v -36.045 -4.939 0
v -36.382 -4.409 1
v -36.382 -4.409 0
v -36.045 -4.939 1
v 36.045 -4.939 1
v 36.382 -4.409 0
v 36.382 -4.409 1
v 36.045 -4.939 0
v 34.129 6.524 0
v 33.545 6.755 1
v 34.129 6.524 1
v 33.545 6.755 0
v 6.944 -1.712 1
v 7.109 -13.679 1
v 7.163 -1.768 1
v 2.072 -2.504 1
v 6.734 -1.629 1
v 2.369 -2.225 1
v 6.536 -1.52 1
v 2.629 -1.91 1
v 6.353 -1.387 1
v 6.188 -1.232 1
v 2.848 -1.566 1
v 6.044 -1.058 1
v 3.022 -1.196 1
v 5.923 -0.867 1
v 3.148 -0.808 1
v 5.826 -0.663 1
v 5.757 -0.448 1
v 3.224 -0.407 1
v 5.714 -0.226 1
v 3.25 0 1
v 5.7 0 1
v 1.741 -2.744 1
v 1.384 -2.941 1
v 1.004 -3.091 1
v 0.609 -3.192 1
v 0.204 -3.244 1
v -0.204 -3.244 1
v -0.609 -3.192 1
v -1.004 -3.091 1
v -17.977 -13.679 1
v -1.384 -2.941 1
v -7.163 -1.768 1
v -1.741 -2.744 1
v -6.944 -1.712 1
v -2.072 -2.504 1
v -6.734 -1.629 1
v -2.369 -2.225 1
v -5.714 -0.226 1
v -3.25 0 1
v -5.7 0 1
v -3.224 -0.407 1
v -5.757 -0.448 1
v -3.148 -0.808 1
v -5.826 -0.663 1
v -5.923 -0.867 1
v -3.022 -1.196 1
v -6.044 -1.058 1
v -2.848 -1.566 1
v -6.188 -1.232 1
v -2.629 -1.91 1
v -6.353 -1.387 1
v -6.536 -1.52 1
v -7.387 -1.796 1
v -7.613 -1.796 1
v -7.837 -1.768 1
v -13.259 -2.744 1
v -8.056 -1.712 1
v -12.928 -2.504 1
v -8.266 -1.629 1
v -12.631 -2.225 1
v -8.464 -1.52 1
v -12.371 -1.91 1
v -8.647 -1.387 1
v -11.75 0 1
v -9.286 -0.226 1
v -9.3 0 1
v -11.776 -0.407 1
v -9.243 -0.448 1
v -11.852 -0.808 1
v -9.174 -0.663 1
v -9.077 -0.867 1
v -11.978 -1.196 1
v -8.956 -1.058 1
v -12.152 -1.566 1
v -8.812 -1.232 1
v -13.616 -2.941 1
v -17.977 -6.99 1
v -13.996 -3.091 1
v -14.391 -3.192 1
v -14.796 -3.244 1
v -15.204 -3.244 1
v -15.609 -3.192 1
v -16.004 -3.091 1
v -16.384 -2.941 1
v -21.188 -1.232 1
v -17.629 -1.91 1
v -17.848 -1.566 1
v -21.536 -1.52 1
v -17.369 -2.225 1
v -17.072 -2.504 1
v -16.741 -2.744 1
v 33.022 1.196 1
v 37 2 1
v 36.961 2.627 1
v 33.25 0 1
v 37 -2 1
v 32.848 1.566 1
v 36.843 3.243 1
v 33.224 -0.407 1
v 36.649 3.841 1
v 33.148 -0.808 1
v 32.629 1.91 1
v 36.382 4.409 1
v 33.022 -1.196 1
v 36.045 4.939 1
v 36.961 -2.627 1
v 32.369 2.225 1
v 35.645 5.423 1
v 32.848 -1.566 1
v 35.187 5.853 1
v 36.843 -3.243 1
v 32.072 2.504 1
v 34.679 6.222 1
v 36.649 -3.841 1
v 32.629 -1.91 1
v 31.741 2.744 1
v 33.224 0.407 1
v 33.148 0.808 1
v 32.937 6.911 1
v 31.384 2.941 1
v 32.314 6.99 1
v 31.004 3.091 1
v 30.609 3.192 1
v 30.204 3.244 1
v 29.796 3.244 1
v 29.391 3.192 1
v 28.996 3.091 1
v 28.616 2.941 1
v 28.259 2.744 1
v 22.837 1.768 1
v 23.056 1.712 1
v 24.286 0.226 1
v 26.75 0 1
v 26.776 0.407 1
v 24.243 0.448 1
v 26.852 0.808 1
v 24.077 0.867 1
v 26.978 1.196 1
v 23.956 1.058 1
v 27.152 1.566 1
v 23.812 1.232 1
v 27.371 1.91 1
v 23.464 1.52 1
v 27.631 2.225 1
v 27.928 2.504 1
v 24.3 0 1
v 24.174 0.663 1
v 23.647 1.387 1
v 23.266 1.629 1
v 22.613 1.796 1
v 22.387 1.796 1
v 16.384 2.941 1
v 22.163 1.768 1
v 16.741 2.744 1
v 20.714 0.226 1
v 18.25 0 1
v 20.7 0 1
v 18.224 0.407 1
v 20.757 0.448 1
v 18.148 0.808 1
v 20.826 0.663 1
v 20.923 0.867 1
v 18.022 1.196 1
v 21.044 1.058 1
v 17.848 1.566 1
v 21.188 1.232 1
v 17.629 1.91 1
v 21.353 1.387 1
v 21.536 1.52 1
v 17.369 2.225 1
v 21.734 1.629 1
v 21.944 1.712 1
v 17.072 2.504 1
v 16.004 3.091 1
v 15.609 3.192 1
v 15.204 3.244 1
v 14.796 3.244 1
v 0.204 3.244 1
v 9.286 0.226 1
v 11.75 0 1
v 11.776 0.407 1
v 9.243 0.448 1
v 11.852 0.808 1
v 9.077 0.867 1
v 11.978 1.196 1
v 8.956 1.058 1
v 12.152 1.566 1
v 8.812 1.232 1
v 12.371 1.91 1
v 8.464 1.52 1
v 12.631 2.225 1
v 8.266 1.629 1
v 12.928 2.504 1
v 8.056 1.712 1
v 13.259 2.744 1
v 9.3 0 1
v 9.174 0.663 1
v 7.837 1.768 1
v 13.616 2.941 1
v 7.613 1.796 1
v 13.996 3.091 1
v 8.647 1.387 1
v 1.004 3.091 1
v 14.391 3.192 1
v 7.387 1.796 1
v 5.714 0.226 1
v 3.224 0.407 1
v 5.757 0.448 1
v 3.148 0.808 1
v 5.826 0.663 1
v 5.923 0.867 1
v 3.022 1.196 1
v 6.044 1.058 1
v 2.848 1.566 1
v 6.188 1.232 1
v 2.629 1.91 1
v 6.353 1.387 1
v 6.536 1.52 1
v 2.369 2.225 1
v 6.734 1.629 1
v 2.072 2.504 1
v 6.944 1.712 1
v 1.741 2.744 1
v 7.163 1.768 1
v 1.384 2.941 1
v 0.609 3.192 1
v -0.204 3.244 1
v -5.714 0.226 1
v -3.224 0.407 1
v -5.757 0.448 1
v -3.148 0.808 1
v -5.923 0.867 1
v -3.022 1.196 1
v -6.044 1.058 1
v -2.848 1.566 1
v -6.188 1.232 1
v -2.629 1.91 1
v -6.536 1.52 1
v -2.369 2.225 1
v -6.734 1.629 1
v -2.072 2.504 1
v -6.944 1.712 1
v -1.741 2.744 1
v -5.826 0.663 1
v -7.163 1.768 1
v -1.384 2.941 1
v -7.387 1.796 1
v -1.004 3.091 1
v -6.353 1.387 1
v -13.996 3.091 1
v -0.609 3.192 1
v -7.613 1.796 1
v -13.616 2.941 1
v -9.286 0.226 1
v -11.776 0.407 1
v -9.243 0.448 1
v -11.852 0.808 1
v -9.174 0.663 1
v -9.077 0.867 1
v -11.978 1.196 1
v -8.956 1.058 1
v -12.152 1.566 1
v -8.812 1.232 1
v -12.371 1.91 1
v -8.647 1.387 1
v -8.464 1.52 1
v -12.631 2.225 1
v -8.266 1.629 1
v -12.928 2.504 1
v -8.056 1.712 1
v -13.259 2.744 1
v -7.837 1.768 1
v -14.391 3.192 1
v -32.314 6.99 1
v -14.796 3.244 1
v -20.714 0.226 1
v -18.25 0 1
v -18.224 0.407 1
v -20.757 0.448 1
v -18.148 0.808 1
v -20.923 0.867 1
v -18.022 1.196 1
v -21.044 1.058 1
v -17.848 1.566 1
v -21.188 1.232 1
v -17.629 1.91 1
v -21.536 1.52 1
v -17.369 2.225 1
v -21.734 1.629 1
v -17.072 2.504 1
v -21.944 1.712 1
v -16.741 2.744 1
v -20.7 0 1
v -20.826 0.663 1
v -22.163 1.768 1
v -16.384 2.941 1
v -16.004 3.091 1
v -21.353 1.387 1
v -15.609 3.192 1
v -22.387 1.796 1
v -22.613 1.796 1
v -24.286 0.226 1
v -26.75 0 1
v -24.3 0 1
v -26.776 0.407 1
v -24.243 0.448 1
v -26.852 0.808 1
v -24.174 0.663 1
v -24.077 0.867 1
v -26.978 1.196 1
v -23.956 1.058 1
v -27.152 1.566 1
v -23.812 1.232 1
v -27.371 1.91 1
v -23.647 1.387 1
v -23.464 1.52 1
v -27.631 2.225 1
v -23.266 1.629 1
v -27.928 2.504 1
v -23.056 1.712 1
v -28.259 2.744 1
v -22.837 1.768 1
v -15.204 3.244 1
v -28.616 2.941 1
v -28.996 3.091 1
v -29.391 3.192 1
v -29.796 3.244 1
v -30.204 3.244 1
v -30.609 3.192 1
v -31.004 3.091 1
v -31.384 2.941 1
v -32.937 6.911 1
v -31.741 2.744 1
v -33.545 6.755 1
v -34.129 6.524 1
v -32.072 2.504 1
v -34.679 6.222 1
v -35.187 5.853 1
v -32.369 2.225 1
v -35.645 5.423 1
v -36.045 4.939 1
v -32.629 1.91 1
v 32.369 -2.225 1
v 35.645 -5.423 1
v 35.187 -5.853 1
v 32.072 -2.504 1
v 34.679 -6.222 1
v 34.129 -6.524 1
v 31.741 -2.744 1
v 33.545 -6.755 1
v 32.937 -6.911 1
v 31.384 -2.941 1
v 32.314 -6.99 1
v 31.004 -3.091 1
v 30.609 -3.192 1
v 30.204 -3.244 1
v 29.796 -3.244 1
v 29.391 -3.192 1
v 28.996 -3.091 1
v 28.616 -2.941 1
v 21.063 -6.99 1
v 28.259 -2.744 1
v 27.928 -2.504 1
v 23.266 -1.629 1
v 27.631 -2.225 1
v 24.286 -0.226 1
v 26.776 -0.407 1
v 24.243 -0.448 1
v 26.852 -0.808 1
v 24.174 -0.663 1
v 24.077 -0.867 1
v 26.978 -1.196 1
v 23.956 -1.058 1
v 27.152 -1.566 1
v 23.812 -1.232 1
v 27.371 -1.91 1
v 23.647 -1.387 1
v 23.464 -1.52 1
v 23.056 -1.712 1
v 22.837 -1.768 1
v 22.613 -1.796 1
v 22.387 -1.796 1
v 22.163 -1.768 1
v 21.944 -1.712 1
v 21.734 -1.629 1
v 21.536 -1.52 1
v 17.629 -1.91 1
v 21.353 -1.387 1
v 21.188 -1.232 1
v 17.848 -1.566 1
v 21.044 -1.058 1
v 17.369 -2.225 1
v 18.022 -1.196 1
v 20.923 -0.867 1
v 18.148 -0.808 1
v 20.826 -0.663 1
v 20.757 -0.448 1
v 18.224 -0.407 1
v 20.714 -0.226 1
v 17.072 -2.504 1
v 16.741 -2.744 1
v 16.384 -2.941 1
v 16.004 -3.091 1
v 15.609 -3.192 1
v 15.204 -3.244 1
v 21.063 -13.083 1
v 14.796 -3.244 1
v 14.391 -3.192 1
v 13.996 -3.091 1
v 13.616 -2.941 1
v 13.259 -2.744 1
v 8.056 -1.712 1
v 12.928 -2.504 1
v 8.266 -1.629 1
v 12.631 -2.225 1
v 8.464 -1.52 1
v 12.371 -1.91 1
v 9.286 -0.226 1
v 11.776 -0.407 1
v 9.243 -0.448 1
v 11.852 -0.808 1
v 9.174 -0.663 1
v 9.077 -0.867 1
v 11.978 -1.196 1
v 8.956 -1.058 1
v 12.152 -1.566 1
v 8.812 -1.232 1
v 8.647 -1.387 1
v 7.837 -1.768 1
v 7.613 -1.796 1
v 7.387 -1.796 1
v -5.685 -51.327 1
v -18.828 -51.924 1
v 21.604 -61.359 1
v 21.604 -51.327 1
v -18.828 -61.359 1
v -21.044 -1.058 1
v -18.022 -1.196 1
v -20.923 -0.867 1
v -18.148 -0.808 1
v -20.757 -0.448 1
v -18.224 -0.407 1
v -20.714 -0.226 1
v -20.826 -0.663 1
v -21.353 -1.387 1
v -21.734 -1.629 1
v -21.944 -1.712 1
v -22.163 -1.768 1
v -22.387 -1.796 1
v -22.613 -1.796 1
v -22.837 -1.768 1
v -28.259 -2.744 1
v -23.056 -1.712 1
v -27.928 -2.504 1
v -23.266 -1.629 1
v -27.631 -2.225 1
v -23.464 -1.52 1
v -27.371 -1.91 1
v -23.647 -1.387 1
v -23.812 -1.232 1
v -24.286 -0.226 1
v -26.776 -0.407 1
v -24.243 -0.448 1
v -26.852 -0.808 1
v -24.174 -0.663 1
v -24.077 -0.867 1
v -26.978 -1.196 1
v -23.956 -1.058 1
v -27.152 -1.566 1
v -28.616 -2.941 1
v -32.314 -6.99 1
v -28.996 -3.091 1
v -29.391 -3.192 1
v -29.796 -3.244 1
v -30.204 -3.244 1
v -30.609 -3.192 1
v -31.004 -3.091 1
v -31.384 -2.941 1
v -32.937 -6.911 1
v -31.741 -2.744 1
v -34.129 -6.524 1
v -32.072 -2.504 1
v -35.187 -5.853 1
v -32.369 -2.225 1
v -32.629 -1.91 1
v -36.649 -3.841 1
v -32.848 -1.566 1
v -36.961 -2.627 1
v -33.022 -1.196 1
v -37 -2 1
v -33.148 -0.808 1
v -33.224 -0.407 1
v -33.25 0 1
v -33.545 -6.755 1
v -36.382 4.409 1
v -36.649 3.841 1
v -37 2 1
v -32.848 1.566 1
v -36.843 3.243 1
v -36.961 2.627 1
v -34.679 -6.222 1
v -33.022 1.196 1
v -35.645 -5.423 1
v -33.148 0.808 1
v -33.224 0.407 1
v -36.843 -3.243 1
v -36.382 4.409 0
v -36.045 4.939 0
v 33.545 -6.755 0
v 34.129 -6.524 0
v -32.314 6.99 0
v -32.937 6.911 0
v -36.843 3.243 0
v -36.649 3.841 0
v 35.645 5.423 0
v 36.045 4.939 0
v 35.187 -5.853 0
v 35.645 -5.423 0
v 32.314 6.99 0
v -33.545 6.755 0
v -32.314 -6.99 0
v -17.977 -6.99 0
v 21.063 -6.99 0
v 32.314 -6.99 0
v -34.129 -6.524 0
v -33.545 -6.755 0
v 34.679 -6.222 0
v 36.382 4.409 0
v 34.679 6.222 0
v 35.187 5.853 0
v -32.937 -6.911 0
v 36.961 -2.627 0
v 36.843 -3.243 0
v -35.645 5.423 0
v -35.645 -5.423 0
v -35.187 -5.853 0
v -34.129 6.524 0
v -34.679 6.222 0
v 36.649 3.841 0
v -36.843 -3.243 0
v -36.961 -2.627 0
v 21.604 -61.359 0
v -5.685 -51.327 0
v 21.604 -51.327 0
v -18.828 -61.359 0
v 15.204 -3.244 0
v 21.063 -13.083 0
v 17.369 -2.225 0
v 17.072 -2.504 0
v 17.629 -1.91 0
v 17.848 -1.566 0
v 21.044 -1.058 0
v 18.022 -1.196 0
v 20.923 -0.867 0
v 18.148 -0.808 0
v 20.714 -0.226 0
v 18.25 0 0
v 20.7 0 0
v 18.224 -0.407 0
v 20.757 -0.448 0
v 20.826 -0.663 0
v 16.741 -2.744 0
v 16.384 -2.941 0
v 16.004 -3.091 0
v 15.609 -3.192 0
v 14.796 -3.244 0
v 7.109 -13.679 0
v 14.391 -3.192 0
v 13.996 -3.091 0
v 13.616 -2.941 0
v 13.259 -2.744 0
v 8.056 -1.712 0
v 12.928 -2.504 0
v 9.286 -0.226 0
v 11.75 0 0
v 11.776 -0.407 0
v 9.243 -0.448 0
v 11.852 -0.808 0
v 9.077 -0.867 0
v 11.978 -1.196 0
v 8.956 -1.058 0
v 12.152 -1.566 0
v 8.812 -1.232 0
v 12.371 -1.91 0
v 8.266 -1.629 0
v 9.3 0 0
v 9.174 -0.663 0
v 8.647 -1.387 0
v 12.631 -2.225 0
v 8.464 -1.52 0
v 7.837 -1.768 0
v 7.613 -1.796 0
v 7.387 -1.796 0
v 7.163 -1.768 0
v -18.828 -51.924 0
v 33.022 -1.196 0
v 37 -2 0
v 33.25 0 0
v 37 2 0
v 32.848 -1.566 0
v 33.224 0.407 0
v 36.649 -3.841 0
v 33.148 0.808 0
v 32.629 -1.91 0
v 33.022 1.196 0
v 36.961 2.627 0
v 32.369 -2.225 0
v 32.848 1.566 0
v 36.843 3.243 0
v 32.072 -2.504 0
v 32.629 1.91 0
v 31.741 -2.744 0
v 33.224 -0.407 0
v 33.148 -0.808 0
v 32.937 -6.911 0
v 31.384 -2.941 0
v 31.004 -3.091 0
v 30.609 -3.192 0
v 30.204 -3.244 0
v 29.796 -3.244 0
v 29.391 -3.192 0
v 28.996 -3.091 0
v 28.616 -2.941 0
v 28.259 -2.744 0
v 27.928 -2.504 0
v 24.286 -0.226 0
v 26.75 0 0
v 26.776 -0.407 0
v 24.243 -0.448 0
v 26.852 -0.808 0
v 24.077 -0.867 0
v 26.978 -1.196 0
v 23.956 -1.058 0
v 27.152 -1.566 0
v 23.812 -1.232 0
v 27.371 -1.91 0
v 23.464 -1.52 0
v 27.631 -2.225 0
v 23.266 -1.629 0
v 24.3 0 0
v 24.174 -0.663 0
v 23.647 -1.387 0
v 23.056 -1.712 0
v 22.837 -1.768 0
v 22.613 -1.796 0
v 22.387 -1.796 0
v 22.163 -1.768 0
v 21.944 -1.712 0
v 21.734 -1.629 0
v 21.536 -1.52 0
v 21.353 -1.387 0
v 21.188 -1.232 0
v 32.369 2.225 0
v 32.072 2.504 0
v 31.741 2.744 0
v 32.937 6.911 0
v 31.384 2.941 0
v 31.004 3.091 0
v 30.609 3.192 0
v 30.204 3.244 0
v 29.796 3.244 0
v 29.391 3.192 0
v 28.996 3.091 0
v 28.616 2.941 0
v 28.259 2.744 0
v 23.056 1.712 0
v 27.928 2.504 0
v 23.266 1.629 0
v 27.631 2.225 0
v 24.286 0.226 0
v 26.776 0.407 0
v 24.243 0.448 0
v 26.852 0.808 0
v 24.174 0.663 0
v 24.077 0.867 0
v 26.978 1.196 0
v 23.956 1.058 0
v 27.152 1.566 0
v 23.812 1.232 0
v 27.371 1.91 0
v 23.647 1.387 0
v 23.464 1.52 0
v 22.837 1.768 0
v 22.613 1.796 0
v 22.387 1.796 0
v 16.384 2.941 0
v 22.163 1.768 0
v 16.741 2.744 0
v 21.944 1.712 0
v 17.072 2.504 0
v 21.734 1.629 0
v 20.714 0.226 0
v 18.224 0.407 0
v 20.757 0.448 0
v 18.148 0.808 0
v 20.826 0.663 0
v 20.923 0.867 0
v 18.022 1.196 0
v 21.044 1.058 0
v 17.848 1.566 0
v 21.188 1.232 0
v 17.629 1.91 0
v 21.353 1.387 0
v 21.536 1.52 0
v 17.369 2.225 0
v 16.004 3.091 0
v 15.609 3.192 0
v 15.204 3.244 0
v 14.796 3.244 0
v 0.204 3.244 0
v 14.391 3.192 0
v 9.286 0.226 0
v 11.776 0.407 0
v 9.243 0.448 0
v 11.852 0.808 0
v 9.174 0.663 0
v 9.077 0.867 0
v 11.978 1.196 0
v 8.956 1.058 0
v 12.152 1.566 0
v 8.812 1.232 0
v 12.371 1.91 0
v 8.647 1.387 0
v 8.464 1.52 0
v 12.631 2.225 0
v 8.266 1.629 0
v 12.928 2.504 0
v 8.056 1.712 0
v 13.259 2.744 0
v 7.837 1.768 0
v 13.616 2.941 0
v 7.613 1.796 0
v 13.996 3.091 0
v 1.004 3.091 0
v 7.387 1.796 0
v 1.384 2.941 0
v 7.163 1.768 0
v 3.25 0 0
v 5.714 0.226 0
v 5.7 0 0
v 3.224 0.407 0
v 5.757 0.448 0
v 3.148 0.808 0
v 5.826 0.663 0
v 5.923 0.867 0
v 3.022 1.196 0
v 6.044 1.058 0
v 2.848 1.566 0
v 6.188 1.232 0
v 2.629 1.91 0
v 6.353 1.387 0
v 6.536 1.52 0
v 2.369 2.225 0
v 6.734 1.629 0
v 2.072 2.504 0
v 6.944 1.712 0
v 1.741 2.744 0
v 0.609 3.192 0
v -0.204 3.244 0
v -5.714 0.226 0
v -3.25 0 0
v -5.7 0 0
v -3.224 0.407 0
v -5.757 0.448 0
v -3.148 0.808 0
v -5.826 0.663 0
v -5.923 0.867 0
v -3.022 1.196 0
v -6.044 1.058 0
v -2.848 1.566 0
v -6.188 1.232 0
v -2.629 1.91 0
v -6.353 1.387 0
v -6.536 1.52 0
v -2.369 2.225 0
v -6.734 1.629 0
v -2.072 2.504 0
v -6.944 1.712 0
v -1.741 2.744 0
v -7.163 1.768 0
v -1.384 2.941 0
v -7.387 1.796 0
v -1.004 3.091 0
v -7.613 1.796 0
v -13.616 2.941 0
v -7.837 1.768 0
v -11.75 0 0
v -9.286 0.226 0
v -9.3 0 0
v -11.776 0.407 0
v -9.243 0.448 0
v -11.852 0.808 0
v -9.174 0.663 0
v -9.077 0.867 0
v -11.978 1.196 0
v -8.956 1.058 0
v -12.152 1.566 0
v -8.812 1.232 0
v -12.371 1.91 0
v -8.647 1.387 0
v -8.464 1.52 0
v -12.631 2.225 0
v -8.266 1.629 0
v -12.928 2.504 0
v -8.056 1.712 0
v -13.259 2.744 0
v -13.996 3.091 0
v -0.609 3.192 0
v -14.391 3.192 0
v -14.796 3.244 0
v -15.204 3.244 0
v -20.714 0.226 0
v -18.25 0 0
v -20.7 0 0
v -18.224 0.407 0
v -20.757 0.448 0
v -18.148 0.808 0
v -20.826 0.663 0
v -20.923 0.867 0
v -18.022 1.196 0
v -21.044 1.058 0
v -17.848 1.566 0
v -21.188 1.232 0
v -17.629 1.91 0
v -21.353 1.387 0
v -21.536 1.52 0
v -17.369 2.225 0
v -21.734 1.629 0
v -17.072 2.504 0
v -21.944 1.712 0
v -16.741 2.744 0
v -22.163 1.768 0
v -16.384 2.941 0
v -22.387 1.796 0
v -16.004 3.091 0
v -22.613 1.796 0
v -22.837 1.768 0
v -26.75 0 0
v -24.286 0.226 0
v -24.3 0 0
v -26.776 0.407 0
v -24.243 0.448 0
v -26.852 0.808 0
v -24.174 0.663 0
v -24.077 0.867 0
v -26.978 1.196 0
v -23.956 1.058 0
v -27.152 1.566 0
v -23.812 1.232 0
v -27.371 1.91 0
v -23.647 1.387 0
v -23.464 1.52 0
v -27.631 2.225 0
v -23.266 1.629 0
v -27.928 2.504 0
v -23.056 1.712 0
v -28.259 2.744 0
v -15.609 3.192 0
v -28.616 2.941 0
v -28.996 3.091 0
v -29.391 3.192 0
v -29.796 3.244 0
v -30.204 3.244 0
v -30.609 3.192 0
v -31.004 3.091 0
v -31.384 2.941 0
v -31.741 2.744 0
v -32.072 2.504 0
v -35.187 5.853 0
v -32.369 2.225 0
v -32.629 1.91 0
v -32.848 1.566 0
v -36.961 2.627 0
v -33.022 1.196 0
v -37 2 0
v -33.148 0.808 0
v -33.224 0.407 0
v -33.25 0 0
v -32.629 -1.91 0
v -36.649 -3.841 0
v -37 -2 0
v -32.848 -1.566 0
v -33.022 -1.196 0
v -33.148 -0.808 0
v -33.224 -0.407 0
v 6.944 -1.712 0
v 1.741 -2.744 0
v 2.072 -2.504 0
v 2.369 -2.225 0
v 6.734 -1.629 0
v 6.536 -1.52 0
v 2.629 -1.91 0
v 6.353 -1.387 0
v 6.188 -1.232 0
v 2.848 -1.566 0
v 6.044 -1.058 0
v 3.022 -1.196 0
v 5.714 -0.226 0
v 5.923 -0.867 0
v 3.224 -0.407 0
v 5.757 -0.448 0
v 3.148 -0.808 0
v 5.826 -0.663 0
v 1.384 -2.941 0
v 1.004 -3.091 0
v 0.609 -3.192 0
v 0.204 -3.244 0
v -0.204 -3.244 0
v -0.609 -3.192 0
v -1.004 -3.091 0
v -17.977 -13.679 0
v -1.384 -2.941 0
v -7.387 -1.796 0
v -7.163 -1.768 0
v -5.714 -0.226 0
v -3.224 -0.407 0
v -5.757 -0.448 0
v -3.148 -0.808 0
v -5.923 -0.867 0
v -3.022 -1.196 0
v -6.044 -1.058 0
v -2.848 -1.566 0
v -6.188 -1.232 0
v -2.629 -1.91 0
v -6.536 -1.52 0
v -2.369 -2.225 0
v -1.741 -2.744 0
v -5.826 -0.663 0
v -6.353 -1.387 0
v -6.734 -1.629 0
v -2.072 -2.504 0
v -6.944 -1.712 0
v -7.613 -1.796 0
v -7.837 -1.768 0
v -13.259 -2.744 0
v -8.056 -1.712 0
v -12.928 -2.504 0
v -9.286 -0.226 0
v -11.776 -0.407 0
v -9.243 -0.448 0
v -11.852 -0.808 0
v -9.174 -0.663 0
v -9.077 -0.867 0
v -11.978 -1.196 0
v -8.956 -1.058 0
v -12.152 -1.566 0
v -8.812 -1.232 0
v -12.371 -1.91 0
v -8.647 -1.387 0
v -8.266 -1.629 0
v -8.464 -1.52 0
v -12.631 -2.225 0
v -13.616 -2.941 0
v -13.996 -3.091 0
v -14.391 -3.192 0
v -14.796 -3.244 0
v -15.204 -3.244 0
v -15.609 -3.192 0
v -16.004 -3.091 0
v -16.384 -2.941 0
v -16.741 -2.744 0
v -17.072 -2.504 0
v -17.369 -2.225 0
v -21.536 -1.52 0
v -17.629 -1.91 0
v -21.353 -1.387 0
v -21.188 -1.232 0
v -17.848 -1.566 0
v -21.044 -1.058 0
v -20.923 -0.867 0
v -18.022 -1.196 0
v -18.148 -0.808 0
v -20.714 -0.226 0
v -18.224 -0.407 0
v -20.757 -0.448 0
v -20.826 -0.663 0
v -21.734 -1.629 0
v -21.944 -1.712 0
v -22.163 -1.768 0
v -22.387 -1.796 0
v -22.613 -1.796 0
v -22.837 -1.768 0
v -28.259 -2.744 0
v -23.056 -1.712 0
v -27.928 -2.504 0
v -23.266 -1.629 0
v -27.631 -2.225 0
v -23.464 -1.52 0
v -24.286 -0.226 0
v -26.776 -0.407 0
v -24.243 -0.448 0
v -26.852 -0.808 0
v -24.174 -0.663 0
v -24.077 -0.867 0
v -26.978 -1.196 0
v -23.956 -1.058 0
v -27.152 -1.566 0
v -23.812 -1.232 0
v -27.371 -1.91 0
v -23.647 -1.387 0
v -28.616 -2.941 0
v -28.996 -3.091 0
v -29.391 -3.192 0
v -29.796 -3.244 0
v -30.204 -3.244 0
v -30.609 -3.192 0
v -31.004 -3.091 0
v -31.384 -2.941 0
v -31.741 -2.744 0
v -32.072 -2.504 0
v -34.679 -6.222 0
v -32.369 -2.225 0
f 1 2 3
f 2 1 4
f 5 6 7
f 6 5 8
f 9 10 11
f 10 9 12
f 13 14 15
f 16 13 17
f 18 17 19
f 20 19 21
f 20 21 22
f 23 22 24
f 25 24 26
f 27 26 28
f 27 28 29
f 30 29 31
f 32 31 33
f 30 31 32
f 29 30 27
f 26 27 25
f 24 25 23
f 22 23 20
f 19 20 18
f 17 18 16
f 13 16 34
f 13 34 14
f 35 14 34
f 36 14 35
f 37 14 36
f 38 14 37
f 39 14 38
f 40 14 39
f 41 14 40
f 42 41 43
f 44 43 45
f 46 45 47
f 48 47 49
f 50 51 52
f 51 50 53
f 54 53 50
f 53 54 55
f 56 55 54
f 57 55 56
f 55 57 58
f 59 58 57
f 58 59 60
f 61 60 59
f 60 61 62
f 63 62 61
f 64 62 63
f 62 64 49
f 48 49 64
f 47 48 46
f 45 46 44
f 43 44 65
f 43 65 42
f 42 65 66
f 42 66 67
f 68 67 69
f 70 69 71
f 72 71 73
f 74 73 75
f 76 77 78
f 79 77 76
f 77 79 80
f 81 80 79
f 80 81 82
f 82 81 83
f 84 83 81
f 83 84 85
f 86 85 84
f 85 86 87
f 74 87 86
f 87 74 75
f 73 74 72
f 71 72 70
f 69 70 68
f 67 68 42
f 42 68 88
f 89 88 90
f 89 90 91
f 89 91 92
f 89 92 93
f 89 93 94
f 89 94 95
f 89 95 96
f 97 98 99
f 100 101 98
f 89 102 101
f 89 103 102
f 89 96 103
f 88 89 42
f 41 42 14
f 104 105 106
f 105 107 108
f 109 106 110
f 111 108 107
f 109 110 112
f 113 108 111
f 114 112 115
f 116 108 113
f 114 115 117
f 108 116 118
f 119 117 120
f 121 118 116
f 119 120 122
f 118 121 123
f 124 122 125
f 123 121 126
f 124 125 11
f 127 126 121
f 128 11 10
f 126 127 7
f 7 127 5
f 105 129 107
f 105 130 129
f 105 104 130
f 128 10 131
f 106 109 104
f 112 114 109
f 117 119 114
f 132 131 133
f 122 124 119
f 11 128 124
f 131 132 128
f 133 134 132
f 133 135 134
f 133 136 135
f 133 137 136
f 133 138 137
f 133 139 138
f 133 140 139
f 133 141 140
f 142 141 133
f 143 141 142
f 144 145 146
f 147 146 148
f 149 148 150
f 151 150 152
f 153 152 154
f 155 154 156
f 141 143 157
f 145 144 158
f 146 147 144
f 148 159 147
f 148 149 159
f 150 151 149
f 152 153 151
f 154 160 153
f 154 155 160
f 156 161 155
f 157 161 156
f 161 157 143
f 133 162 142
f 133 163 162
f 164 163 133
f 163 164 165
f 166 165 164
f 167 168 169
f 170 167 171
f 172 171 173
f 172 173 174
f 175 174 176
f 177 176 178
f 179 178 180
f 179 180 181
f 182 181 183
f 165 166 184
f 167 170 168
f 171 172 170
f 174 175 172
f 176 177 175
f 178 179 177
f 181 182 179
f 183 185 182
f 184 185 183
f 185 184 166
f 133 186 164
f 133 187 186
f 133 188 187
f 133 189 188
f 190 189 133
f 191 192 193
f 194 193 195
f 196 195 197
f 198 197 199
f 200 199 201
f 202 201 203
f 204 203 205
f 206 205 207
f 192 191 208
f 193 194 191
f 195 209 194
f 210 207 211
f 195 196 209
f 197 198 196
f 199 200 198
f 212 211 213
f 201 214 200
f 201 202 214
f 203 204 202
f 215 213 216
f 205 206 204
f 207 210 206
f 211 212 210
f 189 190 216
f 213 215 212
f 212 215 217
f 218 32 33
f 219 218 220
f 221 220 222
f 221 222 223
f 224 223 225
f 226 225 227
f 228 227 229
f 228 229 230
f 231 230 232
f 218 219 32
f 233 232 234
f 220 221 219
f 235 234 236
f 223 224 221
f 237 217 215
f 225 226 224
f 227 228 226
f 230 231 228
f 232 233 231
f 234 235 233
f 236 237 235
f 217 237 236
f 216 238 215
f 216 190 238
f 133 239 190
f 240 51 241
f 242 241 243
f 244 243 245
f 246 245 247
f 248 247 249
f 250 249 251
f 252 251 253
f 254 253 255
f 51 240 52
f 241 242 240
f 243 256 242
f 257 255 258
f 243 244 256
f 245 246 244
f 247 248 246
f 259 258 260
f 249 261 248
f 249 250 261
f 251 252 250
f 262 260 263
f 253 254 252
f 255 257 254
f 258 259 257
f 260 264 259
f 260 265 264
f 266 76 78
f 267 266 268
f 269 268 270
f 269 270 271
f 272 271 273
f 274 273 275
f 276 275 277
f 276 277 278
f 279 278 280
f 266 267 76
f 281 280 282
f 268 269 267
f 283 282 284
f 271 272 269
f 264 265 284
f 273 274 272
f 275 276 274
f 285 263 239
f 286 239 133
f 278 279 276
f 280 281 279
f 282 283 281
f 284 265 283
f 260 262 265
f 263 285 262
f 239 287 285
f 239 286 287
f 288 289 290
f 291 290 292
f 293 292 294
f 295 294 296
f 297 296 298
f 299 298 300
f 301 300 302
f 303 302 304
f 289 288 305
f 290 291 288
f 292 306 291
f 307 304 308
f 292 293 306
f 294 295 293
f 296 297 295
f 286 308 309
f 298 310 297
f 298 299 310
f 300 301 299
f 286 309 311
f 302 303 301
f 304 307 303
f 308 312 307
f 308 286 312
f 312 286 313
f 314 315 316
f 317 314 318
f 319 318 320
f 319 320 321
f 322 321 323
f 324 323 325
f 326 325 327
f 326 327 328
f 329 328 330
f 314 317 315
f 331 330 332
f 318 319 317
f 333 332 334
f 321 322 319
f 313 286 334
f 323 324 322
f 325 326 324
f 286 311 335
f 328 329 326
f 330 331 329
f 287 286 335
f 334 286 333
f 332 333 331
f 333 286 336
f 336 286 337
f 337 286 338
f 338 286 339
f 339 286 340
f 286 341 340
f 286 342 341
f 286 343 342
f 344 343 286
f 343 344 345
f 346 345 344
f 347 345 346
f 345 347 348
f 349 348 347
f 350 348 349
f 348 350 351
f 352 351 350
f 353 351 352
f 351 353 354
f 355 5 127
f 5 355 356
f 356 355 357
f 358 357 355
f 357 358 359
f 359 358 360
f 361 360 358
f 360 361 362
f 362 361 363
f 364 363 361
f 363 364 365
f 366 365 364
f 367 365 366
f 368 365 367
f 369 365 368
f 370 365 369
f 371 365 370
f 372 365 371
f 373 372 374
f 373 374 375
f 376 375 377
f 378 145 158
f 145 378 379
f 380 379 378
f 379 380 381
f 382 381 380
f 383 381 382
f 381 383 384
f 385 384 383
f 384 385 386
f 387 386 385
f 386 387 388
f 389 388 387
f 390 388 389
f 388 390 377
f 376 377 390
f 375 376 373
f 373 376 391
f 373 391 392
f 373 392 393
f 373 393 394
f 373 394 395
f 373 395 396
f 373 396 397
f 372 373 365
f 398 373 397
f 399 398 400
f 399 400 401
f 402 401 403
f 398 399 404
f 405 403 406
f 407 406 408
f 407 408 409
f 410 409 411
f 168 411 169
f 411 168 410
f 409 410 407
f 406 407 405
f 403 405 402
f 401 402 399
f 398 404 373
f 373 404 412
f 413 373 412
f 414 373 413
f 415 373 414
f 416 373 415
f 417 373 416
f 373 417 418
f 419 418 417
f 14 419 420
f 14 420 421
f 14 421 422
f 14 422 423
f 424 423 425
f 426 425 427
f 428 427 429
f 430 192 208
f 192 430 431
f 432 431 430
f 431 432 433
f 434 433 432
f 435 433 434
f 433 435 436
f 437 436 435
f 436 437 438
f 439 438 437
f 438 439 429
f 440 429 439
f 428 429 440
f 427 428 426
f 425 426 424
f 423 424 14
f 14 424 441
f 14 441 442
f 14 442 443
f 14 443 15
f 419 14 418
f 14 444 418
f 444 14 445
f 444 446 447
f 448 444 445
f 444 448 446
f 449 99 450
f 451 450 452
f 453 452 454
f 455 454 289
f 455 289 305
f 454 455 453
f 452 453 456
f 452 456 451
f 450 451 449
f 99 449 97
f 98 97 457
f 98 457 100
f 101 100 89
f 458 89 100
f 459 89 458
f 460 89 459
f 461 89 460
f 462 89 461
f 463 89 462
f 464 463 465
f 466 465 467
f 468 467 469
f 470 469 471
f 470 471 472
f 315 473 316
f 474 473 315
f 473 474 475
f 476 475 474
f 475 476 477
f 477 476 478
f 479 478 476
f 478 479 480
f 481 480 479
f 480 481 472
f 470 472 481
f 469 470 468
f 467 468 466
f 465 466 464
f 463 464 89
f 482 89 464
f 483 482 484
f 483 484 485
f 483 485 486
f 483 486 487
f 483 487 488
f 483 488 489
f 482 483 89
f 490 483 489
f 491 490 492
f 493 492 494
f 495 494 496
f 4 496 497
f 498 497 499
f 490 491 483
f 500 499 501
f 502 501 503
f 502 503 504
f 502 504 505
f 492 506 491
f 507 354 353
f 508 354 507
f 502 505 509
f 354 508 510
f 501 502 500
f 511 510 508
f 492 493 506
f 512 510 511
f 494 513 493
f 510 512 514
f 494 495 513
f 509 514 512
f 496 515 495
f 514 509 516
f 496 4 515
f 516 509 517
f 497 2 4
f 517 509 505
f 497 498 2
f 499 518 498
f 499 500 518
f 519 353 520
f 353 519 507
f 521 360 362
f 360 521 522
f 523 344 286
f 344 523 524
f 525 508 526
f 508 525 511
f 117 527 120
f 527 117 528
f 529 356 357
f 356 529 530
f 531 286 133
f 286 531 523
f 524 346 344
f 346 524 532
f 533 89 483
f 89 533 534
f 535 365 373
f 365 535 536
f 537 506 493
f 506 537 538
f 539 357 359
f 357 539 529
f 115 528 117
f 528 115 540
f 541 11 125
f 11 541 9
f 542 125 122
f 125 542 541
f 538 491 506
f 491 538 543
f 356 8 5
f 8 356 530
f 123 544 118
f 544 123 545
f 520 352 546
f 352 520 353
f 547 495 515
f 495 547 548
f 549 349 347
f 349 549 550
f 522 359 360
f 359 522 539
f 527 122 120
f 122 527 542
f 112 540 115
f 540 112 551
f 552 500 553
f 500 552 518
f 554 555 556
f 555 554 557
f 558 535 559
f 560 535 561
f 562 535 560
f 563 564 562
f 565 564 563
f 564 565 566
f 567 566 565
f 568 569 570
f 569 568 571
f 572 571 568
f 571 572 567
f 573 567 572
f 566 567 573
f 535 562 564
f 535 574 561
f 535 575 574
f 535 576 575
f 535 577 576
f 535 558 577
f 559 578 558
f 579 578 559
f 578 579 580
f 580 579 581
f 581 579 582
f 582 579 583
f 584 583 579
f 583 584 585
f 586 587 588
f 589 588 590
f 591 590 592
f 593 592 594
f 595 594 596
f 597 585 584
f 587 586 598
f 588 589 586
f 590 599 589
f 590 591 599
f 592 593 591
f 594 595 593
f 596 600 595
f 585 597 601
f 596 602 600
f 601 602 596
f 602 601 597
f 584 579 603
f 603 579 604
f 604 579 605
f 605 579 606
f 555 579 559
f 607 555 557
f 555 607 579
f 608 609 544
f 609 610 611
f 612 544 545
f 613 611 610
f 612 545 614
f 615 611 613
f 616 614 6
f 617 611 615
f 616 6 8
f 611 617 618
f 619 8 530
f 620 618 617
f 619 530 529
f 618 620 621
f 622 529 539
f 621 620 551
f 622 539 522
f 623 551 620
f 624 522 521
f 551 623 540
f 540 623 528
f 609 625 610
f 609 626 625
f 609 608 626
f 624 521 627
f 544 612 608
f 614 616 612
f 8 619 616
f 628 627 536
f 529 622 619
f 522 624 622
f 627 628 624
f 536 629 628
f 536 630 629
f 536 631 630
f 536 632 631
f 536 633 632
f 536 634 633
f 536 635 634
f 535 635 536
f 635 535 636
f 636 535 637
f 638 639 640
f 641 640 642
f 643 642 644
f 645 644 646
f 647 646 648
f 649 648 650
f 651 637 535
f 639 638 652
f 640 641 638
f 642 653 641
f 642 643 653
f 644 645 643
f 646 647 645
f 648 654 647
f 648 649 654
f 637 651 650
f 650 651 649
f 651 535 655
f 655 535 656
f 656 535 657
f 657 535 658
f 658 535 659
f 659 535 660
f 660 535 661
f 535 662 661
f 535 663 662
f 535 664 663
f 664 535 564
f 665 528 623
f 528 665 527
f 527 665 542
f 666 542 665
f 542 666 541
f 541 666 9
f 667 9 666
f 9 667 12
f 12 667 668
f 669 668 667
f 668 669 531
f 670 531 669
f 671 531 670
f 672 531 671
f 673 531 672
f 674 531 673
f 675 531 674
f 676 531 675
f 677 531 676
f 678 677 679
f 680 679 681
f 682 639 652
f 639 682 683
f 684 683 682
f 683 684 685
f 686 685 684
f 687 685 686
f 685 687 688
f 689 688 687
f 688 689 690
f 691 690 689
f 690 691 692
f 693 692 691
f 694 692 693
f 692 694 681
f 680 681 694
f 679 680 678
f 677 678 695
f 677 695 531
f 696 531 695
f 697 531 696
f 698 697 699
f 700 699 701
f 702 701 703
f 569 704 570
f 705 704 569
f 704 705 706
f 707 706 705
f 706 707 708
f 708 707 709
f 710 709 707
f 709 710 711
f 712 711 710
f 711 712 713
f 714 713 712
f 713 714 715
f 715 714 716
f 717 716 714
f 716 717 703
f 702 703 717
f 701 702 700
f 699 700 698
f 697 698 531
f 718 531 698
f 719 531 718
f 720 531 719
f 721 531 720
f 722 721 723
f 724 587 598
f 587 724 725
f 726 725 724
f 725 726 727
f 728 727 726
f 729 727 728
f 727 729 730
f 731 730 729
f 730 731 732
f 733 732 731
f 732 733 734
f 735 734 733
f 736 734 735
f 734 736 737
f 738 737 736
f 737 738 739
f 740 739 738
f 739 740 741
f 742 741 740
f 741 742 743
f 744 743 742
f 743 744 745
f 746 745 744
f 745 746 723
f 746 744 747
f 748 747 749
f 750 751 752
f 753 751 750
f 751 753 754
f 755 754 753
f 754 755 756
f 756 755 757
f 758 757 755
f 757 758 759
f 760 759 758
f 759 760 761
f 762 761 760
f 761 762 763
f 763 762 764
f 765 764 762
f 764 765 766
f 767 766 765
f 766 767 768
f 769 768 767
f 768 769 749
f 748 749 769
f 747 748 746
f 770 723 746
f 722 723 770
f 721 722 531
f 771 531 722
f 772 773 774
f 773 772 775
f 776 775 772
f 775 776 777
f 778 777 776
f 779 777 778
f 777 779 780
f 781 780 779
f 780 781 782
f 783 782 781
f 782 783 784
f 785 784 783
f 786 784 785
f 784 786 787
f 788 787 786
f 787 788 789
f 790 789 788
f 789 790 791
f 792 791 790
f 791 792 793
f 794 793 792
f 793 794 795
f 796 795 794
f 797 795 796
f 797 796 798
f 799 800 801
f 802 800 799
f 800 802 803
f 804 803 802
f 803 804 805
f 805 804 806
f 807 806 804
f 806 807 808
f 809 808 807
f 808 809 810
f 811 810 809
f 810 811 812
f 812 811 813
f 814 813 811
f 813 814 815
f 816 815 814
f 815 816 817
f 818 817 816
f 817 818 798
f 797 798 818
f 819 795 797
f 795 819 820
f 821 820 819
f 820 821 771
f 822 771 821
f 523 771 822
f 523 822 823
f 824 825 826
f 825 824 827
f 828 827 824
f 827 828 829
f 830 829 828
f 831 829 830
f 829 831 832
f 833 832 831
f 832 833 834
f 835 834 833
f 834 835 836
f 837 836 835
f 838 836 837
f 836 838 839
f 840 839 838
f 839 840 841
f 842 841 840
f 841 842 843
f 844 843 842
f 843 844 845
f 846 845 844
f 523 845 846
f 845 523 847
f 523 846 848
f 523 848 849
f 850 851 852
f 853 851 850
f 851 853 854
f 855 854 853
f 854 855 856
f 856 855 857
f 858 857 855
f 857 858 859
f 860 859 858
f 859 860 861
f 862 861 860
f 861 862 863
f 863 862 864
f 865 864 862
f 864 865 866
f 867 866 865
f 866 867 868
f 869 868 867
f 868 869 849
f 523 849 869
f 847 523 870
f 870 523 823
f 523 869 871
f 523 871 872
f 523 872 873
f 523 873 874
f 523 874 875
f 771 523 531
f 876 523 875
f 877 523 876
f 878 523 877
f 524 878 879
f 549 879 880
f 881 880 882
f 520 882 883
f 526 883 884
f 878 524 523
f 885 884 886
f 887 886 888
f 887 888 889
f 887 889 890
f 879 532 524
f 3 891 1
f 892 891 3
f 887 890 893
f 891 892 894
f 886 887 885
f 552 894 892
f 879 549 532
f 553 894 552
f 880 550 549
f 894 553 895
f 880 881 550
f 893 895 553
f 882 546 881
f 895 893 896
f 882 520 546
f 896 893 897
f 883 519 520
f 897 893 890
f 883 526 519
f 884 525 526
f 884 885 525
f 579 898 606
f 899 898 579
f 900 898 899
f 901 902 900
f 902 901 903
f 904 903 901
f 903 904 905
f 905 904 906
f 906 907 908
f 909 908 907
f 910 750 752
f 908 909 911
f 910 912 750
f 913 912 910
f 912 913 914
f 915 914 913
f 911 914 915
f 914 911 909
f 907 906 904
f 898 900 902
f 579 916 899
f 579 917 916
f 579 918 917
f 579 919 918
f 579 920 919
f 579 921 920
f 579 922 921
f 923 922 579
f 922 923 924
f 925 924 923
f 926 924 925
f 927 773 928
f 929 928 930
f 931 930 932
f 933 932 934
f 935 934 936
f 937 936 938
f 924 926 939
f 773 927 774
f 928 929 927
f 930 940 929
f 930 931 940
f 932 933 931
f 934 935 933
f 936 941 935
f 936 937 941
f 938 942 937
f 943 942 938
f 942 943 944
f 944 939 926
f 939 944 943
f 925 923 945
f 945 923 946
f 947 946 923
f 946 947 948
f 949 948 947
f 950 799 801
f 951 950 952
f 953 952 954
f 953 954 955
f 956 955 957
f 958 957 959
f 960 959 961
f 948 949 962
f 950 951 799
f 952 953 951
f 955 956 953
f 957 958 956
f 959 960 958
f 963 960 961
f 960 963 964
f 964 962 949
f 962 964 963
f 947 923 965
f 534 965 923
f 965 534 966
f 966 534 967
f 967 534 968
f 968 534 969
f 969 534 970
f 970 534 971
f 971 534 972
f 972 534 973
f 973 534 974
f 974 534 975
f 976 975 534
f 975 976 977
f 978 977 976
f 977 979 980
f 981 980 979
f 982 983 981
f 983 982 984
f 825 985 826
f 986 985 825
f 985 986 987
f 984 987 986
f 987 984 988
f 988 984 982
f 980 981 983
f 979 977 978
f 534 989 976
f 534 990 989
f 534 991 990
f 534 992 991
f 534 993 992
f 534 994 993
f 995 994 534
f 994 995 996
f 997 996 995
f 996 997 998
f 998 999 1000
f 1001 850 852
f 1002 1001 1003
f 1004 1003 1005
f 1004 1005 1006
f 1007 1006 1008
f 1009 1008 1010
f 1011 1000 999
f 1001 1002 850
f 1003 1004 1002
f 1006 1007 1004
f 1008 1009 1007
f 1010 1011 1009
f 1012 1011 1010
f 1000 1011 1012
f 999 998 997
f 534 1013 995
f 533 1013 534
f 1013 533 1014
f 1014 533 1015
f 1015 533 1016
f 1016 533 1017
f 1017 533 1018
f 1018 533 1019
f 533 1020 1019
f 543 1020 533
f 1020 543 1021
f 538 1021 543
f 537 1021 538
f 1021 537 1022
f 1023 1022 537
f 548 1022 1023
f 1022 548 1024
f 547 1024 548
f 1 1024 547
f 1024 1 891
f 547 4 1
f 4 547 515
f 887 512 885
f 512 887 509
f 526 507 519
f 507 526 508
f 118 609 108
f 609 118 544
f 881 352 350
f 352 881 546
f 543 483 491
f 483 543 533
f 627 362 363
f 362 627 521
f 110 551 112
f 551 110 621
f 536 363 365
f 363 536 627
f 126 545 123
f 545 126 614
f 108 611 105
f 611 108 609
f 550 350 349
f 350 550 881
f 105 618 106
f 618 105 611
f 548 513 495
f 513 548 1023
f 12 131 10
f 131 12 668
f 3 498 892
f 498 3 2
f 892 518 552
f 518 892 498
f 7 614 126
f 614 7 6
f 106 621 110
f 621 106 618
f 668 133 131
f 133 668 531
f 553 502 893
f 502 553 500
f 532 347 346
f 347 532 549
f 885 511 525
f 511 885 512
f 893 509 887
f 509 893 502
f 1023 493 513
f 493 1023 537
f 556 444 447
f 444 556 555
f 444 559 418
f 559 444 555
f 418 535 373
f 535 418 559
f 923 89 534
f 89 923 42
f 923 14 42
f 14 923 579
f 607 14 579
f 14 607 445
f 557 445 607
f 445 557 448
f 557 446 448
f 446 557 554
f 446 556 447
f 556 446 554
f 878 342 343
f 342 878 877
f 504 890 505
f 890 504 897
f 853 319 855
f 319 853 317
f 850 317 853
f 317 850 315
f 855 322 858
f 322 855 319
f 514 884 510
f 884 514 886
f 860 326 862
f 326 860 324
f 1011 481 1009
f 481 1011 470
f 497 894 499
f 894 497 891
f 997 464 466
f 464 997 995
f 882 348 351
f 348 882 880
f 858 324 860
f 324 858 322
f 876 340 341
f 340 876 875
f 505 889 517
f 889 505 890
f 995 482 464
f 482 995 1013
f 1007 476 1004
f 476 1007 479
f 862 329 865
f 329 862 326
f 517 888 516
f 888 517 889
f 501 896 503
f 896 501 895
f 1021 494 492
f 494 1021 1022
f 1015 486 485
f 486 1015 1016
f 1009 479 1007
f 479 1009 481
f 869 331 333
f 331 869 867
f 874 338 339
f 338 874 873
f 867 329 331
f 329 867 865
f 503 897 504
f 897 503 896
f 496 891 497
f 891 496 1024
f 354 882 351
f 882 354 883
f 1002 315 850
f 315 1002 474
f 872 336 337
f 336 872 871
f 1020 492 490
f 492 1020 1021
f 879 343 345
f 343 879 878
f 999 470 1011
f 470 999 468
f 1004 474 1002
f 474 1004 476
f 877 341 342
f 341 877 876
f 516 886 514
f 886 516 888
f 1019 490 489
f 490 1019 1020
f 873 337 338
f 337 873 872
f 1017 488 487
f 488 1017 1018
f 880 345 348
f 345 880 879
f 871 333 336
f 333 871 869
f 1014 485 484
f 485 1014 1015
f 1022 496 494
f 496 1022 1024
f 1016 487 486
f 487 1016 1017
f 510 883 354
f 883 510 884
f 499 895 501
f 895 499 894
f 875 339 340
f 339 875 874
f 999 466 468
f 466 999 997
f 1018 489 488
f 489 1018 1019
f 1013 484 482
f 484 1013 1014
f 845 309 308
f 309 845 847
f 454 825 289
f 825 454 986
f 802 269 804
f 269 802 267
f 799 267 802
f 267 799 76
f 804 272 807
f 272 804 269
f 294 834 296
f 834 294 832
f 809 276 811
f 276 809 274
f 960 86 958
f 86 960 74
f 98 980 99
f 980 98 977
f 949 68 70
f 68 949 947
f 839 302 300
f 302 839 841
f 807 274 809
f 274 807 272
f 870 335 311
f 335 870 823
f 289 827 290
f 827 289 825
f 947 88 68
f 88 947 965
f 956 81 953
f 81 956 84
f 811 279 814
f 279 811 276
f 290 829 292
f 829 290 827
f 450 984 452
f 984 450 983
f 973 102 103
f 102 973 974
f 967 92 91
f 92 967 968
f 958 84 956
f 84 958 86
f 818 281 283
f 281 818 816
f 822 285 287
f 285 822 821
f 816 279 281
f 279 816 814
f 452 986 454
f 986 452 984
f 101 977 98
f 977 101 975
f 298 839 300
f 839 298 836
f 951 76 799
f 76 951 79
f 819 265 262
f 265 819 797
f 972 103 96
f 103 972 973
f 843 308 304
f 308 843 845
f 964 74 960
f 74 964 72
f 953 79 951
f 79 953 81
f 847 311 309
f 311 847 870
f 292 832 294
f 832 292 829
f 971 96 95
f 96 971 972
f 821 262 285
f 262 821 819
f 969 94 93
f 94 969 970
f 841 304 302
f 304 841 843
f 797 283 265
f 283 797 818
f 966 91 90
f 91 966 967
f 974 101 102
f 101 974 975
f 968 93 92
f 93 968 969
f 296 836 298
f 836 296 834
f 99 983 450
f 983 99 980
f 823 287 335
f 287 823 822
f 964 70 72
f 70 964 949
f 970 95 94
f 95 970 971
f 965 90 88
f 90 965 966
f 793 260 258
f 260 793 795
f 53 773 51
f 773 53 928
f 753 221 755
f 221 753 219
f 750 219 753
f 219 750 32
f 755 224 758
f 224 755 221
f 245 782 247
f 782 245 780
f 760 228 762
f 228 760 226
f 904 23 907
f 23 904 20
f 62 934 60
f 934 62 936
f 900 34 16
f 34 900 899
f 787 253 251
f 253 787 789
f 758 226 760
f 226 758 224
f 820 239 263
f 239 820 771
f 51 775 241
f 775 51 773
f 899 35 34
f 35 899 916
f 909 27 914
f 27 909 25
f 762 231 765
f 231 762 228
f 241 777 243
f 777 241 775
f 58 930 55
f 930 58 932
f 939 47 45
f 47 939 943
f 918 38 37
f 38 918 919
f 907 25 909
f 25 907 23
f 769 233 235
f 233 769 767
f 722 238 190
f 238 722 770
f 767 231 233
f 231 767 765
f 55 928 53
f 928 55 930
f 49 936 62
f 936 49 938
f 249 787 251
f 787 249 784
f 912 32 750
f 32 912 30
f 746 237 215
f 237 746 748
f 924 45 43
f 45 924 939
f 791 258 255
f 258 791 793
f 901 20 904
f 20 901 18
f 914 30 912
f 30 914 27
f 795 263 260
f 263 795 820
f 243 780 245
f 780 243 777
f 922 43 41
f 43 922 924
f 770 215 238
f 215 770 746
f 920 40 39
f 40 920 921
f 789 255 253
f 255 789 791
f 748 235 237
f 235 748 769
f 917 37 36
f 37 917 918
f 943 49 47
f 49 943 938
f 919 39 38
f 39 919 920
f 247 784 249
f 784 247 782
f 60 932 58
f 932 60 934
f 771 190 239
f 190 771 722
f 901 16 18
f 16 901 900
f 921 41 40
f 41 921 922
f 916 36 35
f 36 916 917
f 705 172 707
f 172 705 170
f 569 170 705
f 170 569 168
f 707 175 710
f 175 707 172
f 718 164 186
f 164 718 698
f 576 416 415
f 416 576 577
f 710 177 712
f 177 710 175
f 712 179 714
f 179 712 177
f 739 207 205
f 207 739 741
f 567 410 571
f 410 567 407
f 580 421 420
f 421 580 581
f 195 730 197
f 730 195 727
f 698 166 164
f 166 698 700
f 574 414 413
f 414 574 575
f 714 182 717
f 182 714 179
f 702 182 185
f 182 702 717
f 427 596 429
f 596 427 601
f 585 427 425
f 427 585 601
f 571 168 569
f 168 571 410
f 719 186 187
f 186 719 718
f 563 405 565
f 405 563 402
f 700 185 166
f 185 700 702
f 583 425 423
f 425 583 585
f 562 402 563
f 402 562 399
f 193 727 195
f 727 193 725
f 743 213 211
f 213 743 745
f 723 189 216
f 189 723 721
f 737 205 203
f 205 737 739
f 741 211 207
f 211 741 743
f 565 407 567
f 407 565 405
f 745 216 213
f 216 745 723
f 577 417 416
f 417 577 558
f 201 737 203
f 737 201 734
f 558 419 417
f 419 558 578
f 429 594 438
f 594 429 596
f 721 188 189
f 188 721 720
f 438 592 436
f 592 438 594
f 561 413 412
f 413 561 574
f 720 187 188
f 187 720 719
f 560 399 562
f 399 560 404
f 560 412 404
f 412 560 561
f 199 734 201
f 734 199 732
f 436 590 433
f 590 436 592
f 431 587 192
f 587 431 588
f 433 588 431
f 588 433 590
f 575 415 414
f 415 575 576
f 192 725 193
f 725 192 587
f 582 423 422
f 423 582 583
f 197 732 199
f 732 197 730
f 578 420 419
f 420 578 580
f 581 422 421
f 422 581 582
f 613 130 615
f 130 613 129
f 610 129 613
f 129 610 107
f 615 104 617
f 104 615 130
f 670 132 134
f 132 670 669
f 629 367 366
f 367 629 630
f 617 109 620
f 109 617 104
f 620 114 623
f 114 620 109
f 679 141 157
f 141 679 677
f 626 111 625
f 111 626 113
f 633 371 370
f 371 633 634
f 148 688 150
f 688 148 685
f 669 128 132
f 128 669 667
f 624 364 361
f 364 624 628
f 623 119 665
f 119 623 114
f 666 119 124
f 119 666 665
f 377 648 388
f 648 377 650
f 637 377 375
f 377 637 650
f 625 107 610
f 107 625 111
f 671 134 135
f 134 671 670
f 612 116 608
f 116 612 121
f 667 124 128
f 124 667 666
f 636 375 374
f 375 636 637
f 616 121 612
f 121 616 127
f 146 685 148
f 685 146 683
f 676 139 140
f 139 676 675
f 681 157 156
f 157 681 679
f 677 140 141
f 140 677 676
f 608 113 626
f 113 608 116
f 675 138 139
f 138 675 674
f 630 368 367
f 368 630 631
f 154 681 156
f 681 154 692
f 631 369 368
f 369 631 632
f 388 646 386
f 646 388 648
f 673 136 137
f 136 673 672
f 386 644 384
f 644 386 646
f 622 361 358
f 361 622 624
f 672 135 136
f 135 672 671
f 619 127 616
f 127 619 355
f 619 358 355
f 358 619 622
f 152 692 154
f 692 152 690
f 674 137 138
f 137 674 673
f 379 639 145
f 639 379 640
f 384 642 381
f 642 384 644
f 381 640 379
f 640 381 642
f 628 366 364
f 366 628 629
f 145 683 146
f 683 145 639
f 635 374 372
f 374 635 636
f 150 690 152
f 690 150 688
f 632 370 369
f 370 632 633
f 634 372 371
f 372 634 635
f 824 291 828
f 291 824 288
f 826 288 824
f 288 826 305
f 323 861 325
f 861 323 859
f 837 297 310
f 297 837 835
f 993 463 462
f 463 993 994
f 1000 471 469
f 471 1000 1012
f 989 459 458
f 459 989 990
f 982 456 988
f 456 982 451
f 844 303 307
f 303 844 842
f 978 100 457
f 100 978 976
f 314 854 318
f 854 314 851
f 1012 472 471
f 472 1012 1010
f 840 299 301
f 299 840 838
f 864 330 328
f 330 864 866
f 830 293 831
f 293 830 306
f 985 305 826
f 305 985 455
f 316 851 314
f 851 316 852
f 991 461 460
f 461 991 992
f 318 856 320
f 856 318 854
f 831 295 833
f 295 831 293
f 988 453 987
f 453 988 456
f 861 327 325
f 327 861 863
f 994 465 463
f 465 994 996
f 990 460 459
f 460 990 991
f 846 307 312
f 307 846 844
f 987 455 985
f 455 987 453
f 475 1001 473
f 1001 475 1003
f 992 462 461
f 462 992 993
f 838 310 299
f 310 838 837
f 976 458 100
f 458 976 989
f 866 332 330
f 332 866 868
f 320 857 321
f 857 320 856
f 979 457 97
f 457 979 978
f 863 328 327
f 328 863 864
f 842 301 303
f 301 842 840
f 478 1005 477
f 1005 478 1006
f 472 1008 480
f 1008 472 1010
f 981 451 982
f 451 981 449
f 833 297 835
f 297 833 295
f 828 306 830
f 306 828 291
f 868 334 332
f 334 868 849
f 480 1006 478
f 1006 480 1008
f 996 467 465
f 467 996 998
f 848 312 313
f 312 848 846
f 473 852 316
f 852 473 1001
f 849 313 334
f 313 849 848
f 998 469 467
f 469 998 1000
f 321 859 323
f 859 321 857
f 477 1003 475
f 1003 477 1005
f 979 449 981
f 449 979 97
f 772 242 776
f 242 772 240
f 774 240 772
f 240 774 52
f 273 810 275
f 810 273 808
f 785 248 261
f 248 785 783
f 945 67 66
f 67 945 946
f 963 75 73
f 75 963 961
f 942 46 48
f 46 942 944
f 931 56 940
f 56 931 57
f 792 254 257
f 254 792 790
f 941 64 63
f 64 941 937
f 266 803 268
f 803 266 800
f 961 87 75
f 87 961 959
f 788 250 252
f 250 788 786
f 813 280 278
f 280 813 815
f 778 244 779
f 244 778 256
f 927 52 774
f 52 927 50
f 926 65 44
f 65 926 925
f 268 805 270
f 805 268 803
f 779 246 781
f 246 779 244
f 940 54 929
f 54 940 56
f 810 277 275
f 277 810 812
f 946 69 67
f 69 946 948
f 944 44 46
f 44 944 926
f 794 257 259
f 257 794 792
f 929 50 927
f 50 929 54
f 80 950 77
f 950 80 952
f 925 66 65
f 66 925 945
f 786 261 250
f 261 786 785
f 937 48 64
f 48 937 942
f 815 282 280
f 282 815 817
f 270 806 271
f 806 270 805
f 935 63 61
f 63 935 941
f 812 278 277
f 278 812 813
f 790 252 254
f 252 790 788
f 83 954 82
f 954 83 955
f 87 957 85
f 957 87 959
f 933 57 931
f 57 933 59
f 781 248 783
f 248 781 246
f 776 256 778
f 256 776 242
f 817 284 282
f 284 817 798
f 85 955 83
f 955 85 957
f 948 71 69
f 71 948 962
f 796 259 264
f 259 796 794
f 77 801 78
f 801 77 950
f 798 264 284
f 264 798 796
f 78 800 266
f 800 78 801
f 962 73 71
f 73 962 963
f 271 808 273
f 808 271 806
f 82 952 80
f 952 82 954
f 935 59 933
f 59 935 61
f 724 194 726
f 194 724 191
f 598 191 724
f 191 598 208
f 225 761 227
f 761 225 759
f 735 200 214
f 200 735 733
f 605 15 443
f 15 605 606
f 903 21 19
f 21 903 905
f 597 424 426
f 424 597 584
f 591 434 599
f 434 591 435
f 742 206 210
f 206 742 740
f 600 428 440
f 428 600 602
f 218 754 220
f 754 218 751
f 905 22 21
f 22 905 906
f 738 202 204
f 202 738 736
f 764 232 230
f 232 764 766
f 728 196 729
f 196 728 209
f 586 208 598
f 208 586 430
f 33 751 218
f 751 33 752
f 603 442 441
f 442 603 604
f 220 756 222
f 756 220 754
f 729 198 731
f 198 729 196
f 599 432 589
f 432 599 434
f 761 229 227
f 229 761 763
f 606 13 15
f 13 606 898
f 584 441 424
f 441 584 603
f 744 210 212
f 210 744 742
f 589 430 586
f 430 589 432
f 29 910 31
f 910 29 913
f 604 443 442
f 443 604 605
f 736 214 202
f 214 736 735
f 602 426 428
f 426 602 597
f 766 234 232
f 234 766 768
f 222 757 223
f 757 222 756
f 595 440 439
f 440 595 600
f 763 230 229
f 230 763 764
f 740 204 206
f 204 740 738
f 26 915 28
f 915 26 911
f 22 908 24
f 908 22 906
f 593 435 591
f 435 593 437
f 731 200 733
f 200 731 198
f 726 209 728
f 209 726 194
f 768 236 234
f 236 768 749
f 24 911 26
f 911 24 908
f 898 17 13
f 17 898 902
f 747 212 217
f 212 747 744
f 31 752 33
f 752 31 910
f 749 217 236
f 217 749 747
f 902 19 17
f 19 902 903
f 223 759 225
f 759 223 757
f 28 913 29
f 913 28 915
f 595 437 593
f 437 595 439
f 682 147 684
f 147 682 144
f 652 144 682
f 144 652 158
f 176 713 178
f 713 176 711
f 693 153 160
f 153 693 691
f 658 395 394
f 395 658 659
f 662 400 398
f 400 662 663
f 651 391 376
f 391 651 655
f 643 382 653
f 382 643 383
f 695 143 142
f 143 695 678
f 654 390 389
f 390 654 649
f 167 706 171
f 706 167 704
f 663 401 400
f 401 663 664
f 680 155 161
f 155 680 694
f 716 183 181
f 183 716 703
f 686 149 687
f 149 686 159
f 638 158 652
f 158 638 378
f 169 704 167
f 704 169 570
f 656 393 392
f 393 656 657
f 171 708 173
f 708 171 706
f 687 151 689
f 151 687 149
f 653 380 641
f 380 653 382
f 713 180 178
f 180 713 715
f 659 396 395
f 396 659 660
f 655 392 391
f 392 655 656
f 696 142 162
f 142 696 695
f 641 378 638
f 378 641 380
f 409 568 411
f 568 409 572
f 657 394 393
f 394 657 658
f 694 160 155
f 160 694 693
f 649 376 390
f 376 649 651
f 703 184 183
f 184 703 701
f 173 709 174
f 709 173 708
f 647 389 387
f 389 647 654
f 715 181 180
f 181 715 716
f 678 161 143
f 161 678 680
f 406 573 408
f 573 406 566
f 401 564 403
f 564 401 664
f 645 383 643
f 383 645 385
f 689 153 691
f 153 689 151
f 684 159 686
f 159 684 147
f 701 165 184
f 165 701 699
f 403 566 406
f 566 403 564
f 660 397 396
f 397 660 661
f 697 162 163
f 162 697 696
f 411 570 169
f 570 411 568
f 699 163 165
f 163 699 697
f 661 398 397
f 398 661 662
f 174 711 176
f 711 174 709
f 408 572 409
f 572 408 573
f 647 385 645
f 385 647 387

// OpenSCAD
$fn = 50;


difference() {
	union() {
		*color(alpha = 1.0000000000, c = "gray") {
			translate(v = [0, 14, 0]) {
				linear_extrude(height = 1) {
					text(font = "Arial:style=Bold", halign = "center", size = 4.5000000000, text = "COMMENT description oobb_plate_shape_p_type_1_depth_5_width_1_thickness_z_extra_oobb_size", valign = "center");
				}
			}
		}
		hull() {
			translate(v = [-32.0000000000, 2.0000000000, 0]) {
				cylinder(h = 1, r = 5);
			}
			translate(v = [32.0000000000, 2.0000000000, 0]) {
				cylinder(h = 1, r = 5);
			}
			translate(v = [-32.0000000000, -2.0000000000, 0]) {
				cylinder(h = 1, r = 5);
			}
			translate(v = [32.0000000000, -2.0000000000, 0]) {
				cylinder(h = 1, r = 5);
			}
		}
		translate(v = [0, -5, 0]) {
			linear_extrude(height = 1) {
				text(font = "DejaVu Sans Mono:style=Bold", halign = "center", size = 57.0000000000, text = "Z", valign = "top");
			}
		}
	}
	union() {
		*color(alpha = 1.0000000000, c = "gray") {
			translate(v = [0, 14, 0]) {
				linear_extrude(height = 1) {
					text(font = "Arial:style=Bold", halign = "center", size = 4.5000000000, text = "COMMENT description oobb_holes_shape_n_type_5_width_1_thickness_z_extra_oobb_size_1_height_'all'_holes_true_both_holes", valign = "center");
				}
			}
		}
		translate(v = [-30.0000000000, 0.0000000000, 0]) {
			translate(v = [0, 0, -50]) {
				cylinder(h = 100, r = 3.2500000000);
			}
		}
		translate(v = [-15.0000000000, 0.0000000000, 0]) {
			translate(v = [0, 0, -50]) {
				cylinder(h = 100, r = 3.2500000000);
			}
		}
		translate(v = [0, 0, -50]) {
			cylinder(h = 100, r = 3.2500000000);
		}
		translate(v = [15.0000000000, 0.0000000000, 0]) {
			translate(v = [0, 0, -50]) {
				cylinder(h = 100, r = 3.2500000000);
			}
		}
		translate(v = [30.0000000000, 0.0000000000, 0]) {
			translate(v = [0, 0, -50]) {
				cylinder(h = 100, r = 3.2500000000);
			}
		}
		translate(v = [-30.0000000000, 0.0000000000, 0]) {
			translate(v = [0, 0, -50]) {
				cylinder(h = 100, r = 1.8000000000);
			}
		}
		translate(v = [-22.5000000000, 0.0000000000, 0]) {
			translate(v = [0, 0, -50]) {
				cylinder(h = 100, r = 1.8000000000);
			}
		}
		translate(v = [-15.0000000000, 0.0000000000, 0]) {
			translate(v = [0, 0, -50]) {
				cylinder(h = 100, r = 1.8000000000);
			}
		}
		translate(v = [-7.5000000000, 0.0000000000, 0]) {
			translate(v = [0, 0, -50]) {
				cylinder(h = 100, r = 1.8000000000);
			}
		}
		translate(v = [0, 0, -50]) {
			cylinder(h = 100, r = 1.8000000000);
		}
		translate(v = [7.5000000000, 0.0000000000, 0]) {
			translate(v = [0, 0, -50]) {
				cylinder(h = 100, r = 1.8000000000);
			}
		}
		translate(v = [15.0000000000, 0.0000000000, 0]) {
			translate(v = [0, 0, -50]) {
				cylinder(h = 100, r = 1.8000000000);
			}
		}
		translate(v = [22.5000000000, 0.0000000000, 0]) {
			translate(v = [0, 0, -50]) {
				cylinder(h = 100, r = 1.8000000000);
			}
		}
		translate(v = [30.0000000000, 0.0000000000, 0]) {
			translate(v = [0, 0, -50]) {
				cylinder(h = 100, r = 1.8000000000);
			}
		}
	}
}
